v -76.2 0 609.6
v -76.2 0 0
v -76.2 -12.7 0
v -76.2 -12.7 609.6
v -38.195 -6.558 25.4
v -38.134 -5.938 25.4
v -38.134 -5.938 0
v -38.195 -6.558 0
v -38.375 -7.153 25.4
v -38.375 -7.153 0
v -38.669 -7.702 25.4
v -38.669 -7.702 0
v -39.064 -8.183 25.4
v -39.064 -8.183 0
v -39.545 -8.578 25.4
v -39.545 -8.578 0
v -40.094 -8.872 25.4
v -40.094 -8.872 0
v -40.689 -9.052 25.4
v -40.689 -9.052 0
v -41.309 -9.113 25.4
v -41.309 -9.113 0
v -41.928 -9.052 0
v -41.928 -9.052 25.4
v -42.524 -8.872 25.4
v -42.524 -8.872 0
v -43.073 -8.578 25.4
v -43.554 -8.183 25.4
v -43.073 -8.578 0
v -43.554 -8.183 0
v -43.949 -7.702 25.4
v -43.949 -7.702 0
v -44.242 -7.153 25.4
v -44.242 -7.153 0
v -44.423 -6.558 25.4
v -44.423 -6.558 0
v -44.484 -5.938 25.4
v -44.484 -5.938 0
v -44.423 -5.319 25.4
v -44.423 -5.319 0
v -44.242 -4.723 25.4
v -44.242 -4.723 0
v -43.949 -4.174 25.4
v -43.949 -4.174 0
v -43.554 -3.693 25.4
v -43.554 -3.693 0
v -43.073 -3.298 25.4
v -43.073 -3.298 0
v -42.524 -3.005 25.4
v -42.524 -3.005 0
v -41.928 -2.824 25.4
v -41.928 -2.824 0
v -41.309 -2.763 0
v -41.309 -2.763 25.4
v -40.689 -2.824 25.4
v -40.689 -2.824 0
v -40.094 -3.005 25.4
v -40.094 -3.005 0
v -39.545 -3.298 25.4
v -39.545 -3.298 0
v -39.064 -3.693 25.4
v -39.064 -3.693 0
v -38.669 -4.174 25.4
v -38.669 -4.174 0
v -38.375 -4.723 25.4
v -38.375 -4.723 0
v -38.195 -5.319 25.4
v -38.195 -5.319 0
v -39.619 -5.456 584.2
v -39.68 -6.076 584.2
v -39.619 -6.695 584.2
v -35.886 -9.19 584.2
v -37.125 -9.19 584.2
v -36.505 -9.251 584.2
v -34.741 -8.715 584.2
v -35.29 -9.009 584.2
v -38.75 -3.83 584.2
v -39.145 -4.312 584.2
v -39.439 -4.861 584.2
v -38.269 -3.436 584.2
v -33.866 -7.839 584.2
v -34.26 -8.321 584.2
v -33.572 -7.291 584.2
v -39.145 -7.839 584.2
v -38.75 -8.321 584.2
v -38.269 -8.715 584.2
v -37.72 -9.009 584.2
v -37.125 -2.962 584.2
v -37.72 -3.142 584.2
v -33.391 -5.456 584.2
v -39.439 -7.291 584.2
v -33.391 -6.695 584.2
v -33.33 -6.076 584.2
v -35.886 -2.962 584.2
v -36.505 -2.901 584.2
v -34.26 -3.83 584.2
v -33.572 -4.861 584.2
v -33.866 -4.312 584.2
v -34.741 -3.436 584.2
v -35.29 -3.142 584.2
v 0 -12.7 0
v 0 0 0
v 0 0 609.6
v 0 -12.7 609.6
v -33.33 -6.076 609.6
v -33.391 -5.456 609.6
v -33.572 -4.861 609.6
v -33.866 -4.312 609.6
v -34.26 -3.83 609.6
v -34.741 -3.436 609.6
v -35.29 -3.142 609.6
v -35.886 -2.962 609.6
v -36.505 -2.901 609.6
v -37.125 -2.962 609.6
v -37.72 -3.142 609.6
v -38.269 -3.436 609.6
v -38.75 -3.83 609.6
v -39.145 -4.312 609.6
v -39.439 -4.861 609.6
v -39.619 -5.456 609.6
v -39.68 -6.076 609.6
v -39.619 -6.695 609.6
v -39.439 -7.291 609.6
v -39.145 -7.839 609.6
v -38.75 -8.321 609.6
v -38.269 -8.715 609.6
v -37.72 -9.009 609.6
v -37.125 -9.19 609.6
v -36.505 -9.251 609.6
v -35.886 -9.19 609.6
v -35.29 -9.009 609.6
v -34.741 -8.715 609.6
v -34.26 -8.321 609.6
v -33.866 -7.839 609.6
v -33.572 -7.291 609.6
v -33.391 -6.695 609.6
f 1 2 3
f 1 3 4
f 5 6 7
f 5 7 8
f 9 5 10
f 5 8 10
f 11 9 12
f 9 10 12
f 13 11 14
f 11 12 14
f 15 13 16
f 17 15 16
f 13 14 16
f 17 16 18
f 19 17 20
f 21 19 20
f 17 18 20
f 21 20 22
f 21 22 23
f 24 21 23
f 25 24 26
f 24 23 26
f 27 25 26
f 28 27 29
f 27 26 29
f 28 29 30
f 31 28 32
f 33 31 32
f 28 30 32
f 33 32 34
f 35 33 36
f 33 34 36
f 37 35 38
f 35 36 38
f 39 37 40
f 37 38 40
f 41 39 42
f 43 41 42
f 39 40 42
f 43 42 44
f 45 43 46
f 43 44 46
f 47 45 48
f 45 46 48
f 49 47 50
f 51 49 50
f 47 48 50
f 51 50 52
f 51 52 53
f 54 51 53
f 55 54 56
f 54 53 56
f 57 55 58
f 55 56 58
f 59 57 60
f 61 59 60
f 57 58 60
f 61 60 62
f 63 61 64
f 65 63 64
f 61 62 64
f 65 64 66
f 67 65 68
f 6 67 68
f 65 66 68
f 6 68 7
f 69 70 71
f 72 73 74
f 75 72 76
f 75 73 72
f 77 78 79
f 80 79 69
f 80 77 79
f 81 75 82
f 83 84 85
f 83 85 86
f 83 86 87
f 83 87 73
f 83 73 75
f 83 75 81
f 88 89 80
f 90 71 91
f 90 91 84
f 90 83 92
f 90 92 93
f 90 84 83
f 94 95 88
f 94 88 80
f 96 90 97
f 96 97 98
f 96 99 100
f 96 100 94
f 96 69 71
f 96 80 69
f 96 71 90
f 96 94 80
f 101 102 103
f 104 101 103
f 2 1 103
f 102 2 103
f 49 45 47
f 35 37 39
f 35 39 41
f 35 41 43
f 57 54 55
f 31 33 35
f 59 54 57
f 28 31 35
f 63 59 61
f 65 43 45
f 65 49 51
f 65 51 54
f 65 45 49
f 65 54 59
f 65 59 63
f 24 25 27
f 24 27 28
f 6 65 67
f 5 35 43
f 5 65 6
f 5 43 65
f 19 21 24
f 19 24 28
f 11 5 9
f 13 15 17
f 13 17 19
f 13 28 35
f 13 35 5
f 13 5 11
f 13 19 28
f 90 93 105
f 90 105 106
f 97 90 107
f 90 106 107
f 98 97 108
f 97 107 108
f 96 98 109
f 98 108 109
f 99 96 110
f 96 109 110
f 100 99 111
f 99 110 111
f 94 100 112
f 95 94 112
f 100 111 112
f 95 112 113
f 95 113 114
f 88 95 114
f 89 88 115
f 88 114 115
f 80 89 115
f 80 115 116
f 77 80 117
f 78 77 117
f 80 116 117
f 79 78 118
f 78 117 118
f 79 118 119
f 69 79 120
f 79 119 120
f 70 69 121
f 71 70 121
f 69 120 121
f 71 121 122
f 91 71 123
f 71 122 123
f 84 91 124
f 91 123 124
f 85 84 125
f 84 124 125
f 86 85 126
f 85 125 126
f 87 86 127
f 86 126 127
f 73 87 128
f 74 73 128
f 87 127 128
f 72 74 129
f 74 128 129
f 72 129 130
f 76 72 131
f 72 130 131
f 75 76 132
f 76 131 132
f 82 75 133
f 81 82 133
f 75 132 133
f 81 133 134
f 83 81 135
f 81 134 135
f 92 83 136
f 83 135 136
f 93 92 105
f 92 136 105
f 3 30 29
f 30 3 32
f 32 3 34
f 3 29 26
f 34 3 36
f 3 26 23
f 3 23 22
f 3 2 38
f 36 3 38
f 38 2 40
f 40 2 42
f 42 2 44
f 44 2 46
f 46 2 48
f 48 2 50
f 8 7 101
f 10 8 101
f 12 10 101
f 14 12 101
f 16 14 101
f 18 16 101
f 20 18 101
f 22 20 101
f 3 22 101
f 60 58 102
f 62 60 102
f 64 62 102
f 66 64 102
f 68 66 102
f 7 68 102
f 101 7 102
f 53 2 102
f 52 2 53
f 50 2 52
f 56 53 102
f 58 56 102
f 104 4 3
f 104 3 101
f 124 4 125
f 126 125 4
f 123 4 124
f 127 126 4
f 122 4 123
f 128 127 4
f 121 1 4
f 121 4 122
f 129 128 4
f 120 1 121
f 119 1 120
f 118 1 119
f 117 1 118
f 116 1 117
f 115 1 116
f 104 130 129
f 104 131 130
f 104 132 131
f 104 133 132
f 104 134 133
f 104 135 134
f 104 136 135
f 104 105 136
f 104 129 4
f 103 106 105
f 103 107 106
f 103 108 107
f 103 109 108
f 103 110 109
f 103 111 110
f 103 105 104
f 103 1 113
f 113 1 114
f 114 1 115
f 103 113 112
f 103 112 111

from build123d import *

# Parameters (mm, degrees)
F0_W     = 76.2
F0_H     = 609.6
F1_DEPTH = 12.7
F2_R     = 3.175
F3_DEPTH = 25.4
F4_R     = 3.175
F5_DEPTH = 25.4


with BuildPart() as f1:
    # F0 (on Front) → F1 (new body)
    with BuildSketch(Plane.XZ):
        with Locations((-38.1, 304.8)):
            Rectangle(F0_W, F0_H)
    extrude(amount=F1_DEPTH)

    # F2 (on face) → F3 (cut)
    with BuildSketch(Plane(origin=(0, 0, 0), x_dir=(1, 0, 0), z_dir=(0, 0, -1))):
        with Locations((-41.308764, 5.938285)):
            Circle(F2_R)
    extrude(amount=-F3_DEPTH, mode=Mode.SUBTRACT)

    # F4 (on face) → F5 (cut)
    with BuildSketch(Plane.XY.offset(609.6)):
        with Locations((-36.50542, -6.075523)):
            Circle(F4_R)
    extrude(amount=-F5_DEPTH, mode=Mode.SUBTRACT)


solid = f1.part
